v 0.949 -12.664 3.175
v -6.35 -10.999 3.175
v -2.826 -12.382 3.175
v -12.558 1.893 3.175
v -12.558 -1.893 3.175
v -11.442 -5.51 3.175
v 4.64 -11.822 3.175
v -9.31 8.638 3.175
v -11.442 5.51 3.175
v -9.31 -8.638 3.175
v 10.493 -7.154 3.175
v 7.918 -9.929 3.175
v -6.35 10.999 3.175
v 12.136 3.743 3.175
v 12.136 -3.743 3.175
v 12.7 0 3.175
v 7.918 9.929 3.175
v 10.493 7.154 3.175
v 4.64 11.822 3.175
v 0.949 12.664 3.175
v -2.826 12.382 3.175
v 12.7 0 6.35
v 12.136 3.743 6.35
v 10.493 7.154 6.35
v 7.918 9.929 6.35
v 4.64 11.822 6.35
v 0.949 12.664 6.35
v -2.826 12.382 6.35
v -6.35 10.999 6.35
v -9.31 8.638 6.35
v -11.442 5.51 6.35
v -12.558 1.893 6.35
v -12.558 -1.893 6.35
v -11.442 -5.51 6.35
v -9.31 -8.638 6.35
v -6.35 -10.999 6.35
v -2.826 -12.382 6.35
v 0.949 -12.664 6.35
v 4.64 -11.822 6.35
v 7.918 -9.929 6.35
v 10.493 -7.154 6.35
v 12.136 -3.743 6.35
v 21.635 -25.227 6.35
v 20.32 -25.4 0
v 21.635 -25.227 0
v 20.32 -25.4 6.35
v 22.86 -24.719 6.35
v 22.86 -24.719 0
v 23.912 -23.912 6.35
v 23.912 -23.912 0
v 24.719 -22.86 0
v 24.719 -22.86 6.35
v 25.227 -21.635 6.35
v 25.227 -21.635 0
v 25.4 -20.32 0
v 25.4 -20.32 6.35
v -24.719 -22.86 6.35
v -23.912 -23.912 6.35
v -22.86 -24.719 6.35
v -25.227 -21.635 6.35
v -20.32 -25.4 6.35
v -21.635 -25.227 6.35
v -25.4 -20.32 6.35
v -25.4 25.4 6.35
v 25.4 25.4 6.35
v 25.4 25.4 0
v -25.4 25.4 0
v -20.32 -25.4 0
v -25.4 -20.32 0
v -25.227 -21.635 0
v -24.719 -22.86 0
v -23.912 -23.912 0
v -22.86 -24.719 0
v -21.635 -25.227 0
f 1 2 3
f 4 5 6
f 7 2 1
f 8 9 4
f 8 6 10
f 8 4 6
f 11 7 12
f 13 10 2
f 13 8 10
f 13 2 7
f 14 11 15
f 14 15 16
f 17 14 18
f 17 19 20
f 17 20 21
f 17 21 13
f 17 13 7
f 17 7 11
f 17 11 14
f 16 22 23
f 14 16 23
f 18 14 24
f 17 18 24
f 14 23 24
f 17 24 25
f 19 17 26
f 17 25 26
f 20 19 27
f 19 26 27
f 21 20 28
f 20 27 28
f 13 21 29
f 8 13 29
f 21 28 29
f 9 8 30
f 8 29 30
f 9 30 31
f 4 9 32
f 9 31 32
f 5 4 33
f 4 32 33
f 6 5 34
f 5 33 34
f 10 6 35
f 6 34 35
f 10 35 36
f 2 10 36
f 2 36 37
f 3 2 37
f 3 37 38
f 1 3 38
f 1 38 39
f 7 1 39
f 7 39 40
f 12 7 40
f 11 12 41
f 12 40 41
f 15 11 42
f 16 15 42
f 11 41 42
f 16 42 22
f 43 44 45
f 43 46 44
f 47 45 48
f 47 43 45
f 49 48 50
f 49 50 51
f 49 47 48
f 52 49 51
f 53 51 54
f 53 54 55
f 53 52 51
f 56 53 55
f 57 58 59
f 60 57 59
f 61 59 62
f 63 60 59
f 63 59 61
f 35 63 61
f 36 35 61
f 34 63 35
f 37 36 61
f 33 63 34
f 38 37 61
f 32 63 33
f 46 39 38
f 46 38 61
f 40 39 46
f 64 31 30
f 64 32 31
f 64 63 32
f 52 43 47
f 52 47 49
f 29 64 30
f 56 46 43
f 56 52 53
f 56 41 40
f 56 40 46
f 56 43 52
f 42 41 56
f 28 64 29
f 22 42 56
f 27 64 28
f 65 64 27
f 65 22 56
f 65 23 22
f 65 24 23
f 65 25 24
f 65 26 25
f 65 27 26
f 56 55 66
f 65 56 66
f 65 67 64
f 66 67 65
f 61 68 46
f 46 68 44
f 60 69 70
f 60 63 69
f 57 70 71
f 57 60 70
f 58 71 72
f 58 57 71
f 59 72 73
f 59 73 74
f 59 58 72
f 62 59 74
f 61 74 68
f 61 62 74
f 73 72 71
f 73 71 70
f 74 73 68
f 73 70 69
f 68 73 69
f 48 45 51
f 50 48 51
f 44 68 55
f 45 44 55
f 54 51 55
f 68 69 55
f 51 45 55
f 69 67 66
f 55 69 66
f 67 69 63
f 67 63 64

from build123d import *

# Parameters (mm, degrees)
F0_W     = 50.8
F0_H     = 50.8
F1_DEPTH = 6.35
F2_R     = 5.08
F3_R     = 12.7
F4_DEPTH = 3.175


with BuildPart() as f1:
    # F0 (on Top) → F1 (new body)
    with BuildSketch(Plane.XY):
        Rectangle(F0_W, F0_H)
    extrude(amount=F1_DEPTH)

    # F2
    f2_edges = [f1.edges().sort_by_distance(p)[0] for p in [
        (-25.4, -25.4, 3.175),
        (25.4, -25.4, 3.175),
    ]]
    fillet(f2_edges, radius=F2_R)

    # F3 (on face) → F4 (cut)
    with BuildSketch(Plane.XY.offset(6.35)):
        Circle(F3_R)
    extrude(amount=-F4_DEPTH, mode=Mode.SUBTRACT)


solid = f1.part
